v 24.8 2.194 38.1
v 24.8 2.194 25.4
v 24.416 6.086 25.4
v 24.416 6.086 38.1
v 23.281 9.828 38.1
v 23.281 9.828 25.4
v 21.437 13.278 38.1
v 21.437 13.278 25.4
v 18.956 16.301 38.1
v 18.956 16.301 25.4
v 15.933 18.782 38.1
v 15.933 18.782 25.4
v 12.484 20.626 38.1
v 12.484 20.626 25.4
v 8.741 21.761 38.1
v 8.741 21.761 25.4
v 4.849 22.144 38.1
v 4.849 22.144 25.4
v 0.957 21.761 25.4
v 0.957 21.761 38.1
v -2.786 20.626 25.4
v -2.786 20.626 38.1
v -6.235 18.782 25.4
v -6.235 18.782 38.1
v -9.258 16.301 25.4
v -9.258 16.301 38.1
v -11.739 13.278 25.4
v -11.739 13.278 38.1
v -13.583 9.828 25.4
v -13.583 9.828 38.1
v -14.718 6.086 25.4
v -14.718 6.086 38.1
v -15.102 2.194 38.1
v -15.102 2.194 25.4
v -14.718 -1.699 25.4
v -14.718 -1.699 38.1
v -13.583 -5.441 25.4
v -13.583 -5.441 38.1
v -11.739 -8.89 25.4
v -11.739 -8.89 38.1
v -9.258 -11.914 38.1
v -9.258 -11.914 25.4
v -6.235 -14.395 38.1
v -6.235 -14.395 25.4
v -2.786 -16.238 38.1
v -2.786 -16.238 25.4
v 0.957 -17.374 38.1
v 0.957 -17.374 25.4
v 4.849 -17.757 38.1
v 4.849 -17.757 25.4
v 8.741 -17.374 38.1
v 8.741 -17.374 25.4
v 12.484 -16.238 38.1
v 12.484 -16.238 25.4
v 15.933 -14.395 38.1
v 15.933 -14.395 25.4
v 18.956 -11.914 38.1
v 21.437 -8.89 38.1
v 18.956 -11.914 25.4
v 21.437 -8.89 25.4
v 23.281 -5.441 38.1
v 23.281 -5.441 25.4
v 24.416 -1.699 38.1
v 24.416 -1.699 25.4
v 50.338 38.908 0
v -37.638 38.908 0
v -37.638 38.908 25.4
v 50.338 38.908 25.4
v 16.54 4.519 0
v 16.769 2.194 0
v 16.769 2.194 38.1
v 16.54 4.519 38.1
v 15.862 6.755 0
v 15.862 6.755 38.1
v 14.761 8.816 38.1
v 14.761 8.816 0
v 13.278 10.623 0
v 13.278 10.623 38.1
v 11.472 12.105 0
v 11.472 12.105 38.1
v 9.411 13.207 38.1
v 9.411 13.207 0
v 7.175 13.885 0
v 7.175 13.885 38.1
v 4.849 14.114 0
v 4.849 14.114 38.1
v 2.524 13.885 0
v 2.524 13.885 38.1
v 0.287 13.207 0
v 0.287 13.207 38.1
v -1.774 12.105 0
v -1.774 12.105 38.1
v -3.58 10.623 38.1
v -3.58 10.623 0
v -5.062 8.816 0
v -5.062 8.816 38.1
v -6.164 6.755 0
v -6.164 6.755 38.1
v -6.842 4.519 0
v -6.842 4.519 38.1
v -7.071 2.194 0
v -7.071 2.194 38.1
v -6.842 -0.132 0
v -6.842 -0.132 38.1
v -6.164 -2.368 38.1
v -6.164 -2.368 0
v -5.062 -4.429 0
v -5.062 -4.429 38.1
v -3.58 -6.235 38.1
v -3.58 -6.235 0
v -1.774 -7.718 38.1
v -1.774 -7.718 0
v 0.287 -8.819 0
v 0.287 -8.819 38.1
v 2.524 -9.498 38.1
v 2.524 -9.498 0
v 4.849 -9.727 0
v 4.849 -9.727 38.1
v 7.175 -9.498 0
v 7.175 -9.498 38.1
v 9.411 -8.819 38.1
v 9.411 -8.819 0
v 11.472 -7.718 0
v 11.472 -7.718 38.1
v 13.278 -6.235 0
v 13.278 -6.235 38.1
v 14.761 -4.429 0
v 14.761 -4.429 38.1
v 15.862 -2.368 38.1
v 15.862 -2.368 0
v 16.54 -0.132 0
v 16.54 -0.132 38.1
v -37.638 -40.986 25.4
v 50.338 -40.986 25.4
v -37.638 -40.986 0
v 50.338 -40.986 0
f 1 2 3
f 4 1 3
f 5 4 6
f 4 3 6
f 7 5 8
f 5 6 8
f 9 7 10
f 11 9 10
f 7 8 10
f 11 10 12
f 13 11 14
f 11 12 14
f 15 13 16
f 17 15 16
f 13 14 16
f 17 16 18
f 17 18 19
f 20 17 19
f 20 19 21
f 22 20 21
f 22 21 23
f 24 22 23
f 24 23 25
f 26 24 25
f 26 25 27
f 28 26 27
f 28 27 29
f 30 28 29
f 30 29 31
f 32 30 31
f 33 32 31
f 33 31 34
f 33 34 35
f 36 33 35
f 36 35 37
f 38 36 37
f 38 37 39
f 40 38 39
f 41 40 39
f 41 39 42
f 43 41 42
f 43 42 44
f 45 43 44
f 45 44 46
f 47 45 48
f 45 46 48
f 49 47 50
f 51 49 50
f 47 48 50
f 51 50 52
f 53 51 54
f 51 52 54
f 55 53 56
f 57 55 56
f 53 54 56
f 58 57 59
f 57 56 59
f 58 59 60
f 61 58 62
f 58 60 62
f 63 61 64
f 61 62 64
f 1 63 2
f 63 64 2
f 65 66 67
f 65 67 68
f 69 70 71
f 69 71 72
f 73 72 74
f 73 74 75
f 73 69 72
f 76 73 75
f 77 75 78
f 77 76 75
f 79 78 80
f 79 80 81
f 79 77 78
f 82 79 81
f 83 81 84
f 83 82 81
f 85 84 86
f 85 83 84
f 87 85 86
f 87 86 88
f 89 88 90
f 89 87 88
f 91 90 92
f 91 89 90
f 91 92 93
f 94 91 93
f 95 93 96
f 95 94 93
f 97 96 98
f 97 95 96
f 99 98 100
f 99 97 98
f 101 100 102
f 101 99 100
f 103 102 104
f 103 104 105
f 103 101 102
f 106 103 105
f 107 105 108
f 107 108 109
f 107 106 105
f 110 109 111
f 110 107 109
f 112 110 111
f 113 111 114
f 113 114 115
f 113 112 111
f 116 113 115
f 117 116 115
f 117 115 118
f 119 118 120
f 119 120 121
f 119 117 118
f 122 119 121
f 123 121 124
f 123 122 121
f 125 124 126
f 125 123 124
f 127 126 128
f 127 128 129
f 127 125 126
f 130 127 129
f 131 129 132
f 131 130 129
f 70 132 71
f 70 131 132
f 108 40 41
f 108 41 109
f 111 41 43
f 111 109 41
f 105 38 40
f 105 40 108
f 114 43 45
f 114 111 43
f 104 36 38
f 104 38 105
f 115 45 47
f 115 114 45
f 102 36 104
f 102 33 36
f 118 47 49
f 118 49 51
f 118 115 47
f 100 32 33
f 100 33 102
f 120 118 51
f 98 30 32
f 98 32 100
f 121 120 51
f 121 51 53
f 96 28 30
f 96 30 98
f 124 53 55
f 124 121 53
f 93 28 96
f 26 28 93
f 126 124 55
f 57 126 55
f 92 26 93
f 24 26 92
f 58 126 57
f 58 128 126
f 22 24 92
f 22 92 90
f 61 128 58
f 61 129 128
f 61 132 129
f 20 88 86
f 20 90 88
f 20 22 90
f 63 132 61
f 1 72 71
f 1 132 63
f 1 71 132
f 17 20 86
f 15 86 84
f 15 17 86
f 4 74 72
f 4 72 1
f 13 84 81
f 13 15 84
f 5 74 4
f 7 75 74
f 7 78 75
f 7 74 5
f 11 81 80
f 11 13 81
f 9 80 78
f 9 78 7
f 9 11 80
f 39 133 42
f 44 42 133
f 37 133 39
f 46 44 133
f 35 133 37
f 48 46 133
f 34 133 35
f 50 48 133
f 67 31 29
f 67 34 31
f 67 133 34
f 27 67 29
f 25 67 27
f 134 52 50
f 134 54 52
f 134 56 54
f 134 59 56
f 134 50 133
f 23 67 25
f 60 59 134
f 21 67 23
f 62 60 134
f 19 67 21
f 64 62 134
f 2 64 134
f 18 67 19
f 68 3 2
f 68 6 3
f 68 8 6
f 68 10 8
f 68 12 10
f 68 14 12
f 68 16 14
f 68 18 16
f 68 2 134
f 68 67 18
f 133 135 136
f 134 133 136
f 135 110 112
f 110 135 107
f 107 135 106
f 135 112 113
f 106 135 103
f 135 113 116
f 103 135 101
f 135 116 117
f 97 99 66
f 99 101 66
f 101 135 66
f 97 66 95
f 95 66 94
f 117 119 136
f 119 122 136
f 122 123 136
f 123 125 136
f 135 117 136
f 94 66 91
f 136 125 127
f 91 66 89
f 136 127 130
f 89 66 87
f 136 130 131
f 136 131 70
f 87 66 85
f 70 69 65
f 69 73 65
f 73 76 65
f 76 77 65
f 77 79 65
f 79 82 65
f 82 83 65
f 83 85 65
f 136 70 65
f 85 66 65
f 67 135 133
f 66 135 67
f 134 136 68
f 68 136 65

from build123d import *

# Parameters (mm, degrees)
F0_R     = 19.950599
F0_R_2   = 11.920368
F1_DEPTH = 38.1
F0_W     = 87.976367
F0_H     = 79.894547
F2_DEPTH = 25.4


with BuildPart() as f1:
    # F0 (on Top) → F1 (new body)
    with BuildSketch(Plane.XY):
        with Locations((4.849092, 2.193636)):
            Circle(F0_R)
        with Locations((4.849092, 2.193636)):
            Circle(F0_R_2, mode=Mode.SUBTRACT)
    extrude(amount=F1_DEPTH)

    # F0 (on Top) → F2 (join)
    with BuildSketch(Plane.XY):
        with Locations((6.35, -1.039089)):
            Rectangle(F0_W, F0_H)
        with Locations((4.849092, 2.193636)):
            Circle(F0_R, mode=Mode.SUBTRACT)
    extrude(amount=F2_DEPTH)


solid = f1.part
